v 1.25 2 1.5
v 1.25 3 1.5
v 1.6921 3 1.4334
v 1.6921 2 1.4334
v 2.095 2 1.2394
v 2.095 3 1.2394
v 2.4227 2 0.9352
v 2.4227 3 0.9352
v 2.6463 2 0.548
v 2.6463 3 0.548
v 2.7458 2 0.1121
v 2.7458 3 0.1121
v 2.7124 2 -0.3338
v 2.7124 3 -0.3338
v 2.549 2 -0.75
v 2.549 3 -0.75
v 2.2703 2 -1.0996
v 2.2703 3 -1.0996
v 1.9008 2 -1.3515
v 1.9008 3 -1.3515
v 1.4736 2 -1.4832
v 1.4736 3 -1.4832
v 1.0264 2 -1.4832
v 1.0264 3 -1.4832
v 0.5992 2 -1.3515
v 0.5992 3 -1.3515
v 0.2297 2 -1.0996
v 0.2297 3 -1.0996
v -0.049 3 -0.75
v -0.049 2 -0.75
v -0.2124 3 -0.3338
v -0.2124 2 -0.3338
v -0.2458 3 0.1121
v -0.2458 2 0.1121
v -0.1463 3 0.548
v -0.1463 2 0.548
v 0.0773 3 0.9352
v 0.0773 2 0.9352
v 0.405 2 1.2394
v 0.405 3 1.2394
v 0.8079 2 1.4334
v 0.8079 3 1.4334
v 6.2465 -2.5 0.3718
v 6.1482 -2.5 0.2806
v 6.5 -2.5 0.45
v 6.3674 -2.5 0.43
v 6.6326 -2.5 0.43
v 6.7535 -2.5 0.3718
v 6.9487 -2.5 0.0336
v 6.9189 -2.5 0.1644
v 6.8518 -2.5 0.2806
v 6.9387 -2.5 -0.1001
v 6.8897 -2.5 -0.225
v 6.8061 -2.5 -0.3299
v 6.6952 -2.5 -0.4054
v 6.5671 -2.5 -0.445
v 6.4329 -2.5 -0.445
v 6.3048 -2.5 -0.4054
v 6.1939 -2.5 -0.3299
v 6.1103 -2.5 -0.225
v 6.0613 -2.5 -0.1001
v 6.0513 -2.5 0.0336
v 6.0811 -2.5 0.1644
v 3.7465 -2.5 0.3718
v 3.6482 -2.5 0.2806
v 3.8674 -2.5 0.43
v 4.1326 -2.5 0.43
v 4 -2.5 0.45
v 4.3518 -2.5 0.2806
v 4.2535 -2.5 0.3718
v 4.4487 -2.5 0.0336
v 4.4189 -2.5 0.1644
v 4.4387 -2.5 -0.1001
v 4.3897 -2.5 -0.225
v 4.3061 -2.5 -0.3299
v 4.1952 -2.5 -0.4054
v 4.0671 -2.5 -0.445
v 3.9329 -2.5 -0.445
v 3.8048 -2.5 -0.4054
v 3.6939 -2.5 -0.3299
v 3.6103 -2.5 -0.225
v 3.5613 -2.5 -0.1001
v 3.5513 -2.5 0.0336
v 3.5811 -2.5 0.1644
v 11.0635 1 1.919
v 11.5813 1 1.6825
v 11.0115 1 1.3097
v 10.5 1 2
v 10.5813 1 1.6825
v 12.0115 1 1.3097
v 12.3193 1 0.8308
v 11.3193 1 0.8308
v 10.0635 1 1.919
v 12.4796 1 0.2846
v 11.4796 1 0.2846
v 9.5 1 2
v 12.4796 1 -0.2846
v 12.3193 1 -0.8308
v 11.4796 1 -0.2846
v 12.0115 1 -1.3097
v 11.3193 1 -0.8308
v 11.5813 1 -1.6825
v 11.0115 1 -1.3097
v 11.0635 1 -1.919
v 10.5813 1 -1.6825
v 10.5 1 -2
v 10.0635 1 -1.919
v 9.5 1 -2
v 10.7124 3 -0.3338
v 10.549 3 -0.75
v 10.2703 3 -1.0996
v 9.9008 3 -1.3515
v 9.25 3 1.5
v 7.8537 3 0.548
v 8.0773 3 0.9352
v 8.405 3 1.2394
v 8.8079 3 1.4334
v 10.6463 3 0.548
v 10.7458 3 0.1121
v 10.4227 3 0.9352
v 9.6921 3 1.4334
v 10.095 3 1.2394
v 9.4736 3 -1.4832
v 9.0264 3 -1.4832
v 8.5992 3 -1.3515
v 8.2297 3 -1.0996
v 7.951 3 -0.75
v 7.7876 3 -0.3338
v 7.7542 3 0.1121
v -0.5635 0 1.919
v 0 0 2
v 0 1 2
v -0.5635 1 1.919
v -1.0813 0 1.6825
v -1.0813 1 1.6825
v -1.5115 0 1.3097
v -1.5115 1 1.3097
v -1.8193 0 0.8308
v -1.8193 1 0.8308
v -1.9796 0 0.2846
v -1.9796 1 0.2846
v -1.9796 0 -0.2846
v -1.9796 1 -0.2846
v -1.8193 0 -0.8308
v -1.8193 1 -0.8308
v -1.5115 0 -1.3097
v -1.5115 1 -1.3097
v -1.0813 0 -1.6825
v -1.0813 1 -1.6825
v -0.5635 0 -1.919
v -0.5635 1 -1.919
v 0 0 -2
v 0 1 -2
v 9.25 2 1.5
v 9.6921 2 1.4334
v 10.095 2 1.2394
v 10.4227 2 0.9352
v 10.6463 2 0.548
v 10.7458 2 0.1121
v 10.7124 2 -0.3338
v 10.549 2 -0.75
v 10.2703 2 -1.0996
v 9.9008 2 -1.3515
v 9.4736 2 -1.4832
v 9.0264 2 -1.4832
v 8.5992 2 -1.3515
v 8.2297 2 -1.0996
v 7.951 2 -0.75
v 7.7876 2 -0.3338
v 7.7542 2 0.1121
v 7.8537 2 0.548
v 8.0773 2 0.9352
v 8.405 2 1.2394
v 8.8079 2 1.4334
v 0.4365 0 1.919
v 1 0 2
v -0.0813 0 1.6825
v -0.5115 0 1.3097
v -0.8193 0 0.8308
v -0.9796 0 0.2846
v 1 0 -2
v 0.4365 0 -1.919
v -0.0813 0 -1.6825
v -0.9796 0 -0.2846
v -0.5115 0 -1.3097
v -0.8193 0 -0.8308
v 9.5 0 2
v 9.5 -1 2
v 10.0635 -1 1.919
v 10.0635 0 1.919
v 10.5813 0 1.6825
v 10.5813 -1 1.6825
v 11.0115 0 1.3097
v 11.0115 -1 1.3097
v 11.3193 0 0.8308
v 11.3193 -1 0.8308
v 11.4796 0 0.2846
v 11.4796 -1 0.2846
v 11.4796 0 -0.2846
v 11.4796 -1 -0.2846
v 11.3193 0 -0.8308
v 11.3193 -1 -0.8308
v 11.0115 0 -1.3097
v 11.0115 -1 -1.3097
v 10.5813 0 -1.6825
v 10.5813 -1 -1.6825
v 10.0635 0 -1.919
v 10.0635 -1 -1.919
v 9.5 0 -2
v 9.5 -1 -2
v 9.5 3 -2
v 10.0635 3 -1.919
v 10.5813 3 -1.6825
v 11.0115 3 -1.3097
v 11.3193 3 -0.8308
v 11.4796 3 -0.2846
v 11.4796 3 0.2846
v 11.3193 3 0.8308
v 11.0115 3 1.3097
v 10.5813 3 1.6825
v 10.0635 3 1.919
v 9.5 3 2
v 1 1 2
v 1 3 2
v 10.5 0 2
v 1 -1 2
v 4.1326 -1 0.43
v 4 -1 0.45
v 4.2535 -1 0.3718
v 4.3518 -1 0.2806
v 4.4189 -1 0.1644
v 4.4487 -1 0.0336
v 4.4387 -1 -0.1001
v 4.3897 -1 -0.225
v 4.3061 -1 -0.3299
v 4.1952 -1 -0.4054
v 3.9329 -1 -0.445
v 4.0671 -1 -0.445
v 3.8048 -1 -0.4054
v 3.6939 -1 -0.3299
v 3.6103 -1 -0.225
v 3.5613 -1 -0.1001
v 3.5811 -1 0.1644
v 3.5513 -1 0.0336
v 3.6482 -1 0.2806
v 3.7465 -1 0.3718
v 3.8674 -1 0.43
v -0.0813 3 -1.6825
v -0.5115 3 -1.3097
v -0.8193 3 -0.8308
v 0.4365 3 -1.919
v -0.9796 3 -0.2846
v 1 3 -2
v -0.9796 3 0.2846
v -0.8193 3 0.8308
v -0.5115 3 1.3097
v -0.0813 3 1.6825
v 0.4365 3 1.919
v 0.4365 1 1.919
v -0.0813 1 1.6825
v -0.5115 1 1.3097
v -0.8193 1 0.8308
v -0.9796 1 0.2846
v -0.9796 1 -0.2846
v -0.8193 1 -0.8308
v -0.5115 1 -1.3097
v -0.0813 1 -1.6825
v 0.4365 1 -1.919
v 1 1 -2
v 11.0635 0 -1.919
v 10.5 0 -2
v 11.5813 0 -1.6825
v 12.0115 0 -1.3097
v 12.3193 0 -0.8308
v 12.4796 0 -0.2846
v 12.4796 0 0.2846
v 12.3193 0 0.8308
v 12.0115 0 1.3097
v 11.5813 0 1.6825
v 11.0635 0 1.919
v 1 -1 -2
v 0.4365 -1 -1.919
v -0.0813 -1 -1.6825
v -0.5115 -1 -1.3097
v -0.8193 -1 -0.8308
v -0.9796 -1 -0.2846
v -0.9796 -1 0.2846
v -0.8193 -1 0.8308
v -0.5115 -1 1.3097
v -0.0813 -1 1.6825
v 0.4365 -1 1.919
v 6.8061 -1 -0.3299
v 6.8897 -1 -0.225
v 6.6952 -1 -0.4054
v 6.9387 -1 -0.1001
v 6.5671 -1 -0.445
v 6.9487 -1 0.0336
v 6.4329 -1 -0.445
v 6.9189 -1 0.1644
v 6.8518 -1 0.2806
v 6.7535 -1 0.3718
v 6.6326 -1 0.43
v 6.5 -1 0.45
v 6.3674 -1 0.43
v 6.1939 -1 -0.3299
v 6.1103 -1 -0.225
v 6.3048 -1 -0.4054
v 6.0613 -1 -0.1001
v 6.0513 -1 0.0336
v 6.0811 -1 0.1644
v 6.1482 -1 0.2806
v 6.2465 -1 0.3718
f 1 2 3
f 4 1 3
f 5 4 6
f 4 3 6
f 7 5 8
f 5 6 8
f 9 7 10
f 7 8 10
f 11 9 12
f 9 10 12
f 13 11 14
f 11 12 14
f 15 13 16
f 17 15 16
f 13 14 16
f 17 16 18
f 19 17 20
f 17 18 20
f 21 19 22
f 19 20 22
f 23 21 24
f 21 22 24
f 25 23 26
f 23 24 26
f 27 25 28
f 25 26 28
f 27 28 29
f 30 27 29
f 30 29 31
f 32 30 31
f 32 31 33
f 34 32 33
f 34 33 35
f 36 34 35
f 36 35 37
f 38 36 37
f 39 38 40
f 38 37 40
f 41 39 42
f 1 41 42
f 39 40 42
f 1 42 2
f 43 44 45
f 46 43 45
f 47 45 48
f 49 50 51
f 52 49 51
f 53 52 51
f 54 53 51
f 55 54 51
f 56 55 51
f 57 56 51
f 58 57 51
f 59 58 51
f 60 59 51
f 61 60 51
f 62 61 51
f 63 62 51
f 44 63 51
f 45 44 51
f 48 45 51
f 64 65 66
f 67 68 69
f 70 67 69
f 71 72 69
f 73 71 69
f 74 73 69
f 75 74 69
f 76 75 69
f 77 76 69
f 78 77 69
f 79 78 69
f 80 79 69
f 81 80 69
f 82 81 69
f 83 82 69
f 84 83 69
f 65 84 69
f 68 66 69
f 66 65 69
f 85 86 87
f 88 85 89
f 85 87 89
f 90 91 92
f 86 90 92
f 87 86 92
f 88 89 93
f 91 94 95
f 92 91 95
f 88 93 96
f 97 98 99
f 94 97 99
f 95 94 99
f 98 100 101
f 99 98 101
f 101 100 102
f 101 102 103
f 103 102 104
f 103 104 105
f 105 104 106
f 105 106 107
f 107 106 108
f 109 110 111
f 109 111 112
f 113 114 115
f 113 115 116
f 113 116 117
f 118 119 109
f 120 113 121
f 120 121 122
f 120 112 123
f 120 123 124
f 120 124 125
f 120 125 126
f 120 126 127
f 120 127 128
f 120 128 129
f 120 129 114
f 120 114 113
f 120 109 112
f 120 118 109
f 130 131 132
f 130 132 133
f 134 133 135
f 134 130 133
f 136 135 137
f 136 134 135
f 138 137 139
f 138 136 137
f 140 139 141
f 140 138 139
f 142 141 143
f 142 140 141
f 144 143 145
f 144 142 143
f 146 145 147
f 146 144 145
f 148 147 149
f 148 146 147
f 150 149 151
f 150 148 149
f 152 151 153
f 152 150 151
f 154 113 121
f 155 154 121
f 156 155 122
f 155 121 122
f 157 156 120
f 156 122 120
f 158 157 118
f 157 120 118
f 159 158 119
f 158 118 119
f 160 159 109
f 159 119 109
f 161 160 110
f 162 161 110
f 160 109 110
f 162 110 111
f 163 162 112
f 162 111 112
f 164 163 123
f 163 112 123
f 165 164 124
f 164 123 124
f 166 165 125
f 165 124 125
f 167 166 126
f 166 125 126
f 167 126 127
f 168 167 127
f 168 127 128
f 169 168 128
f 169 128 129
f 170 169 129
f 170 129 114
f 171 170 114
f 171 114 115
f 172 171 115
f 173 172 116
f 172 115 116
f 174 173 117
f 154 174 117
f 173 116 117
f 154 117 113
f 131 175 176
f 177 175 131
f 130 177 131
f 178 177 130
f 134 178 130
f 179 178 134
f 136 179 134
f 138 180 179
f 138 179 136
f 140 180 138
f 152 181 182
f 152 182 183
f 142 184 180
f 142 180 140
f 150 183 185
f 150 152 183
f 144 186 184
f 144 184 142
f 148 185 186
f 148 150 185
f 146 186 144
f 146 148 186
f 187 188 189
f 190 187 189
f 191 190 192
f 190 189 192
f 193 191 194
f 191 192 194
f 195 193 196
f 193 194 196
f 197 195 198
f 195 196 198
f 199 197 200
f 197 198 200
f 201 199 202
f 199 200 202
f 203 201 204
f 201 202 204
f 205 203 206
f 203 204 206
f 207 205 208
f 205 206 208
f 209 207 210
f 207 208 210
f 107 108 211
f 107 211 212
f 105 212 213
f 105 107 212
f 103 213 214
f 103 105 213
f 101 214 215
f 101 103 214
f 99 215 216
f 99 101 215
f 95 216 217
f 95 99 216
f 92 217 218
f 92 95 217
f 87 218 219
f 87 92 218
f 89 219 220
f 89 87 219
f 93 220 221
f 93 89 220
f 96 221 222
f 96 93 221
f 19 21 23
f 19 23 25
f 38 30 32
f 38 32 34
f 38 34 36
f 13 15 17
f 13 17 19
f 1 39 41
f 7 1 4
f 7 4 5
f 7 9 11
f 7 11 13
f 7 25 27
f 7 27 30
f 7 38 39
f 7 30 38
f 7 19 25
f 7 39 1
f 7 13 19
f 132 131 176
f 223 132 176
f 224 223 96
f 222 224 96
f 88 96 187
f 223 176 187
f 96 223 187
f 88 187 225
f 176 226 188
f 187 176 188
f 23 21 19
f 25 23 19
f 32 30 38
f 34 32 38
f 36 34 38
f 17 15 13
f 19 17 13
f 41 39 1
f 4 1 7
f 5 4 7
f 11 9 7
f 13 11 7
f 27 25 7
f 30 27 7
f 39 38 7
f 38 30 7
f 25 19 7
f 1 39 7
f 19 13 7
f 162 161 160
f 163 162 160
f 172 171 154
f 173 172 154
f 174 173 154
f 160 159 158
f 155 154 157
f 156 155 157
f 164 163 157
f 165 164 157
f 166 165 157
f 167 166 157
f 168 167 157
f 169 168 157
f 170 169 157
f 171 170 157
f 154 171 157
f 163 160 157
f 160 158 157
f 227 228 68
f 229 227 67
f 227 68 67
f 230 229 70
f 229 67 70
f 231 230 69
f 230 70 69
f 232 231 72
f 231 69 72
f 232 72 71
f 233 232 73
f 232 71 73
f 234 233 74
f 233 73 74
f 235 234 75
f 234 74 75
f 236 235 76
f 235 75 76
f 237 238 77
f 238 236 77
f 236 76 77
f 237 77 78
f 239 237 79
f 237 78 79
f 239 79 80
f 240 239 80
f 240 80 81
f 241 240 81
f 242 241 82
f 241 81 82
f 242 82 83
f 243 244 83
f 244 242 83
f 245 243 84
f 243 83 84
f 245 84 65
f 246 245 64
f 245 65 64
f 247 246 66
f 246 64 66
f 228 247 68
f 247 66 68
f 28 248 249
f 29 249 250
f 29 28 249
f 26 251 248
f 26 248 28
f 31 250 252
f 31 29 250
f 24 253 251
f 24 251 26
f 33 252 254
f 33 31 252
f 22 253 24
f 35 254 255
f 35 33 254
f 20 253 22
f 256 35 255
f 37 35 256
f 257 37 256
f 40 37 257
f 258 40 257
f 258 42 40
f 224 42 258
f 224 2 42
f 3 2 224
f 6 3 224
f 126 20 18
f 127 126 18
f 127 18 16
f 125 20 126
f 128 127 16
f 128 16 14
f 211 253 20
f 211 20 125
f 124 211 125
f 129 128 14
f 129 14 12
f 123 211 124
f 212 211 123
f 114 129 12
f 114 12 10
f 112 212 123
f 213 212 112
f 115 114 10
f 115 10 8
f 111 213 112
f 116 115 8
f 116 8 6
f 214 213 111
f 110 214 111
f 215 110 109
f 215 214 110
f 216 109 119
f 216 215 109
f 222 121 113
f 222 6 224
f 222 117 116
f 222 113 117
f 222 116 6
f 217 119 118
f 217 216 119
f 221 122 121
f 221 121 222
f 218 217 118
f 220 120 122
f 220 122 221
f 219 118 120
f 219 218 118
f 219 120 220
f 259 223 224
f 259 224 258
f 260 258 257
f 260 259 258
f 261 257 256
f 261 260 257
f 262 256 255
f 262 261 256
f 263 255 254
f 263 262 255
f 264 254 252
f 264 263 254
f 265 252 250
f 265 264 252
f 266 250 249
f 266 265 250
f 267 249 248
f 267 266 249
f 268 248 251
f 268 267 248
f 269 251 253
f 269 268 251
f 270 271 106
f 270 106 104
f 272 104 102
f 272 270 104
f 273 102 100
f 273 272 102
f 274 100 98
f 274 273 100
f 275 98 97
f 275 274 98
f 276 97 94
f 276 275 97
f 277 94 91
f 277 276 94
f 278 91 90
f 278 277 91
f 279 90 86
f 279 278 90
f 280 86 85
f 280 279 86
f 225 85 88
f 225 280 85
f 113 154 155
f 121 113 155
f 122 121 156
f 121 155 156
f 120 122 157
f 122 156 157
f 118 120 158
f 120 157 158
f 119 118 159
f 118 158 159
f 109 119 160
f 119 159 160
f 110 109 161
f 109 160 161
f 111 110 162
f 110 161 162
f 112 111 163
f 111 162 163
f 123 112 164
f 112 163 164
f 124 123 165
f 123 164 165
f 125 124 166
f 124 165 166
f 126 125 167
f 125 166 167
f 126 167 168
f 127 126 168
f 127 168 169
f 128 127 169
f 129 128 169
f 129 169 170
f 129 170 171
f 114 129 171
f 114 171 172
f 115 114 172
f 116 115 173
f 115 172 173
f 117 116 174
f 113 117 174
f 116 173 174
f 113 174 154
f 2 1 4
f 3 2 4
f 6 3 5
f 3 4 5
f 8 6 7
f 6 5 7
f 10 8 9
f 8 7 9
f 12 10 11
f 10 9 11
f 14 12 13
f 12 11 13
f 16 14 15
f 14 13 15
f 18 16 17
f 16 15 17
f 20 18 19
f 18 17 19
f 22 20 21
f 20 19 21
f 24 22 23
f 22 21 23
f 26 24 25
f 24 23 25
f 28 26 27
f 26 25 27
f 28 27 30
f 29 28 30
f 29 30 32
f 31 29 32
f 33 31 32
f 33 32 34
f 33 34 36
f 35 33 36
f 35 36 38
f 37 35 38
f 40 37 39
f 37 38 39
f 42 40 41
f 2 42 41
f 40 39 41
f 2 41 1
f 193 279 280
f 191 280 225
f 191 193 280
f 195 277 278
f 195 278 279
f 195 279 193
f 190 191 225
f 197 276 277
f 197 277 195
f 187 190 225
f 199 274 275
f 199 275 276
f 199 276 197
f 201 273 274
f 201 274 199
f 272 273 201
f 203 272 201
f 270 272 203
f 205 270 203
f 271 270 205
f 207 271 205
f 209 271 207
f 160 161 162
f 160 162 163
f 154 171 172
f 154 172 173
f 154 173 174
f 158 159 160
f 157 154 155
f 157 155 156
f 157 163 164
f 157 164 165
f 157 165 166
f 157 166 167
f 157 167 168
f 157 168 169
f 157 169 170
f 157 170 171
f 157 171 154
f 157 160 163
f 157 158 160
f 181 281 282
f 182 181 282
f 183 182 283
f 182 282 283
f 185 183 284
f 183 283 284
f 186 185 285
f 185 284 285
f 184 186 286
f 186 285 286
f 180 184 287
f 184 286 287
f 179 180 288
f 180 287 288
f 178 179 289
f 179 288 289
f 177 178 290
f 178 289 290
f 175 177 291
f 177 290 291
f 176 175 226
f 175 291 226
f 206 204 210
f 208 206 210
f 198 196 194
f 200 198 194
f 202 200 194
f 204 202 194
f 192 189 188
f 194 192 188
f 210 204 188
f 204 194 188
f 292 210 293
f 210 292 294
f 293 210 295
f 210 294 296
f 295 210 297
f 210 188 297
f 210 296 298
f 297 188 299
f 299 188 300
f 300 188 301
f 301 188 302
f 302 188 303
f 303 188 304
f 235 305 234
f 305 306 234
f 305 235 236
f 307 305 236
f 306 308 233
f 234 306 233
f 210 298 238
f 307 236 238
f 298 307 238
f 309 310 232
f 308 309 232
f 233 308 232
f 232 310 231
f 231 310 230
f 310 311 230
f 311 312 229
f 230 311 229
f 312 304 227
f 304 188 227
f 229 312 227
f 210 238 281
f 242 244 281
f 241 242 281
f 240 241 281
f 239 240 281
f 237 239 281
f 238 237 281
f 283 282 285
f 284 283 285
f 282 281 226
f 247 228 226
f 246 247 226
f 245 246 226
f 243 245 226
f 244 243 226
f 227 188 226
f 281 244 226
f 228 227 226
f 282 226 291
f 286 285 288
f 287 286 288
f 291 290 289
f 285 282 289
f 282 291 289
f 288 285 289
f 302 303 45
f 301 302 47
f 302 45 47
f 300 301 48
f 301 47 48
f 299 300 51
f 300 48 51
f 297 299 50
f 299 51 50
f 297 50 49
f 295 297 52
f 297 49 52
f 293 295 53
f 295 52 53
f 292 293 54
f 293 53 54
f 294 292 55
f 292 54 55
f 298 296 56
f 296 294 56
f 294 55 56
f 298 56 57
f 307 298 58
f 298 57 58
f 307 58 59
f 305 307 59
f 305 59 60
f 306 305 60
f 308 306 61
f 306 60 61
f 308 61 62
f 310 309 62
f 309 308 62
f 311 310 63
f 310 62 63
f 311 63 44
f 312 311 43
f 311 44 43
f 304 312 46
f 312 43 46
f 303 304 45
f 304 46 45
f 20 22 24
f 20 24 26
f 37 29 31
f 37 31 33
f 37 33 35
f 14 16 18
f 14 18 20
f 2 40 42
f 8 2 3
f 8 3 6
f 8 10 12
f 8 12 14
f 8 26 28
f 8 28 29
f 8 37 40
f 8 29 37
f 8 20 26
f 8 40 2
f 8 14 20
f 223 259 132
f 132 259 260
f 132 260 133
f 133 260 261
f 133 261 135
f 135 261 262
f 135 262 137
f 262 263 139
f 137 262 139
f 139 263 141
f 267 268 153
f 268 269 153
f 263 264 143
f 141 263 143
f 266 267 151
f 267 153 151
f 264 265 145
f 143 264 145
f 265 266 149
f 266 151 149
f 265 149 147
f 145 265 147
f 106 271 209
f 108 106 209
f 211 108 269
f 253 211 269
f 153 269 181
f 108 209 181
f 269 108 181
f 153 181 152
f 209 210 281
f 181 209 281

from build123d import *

# Parameters (mm, degrees)
BOSS_EXTRUDE2_DEPTH         = 1
BOSS_EXTRUDE3_DEPTH         = 2
SKETCH7_R                   = 1.5
SKETCH7_R_2                 = 0.45
CUT_EXTRUDE1_DEPTH          = 1
SKETCH8_R                   = 1.5
BOSS_EXTRUDE4_DEPTH         = 1
BOSS_EXTRUDE4_2_DEPTH       = 1
BOSS_EXTRUDE12_DEPTH        = 1
BOSS_EXTRUDE12_DEPTH_BACK   = 4.5
SKETCH9_R                   = 0.45
BOSS_EXTRUDE12_2_DEPTH      = 1
BOSS_EXTRUDE12_2_DEPTH_BACK = 4.5
BOSS_EXTRUDE13_START        = 1
BOSS_EXTRUDE13_DEPTH        = 1


with BuildPart() as part:
    # Sketch4 → Boss-Extrude2 (new body)
    with BuildSketch(Plane(origin=(0, 0, 0), x_dir=(1, 0, 0), z_dir=(0, 1, 0))):
        with BuildLine():
            Line((0, 2), (10.5, 2))
            ThreePointArc((10.5, 2), (12.5, 0), (10.5, -2))
            Line((10.5, -2), (0, -2))
            ThreePointArc((0, -2), (-2, 0), (0, 2))
        make_face()
    extrude(amount=BOSS_EXTRUDE2_DEPTH)

    # Sketch5 → Boss-Extrude3 (add)
    with BuildSketch(Plane(origin=(0, 1, 0), x_dir=(1, 0, 0), z_dir=(0, 1, 0))):
        with BuildLine():
            Line((1, 2), (9.5, 2))
            ThreePointArc((9.5, 2), (11.5, 0), (9.5, -2))
            Line((9.5, -2), (1, -2))
            ThreePointArc((1, -2), (-1, 0), (1, 2))
        make_face()
    extrude(amount=BOSS_EXTRUDE3_DEPTH)

    # Sketch7 → Cut-Extrude1 (cut)
    with BuildSketch(Plane(origin=(0, 3, 0), x_dir=(1, 0, 0), z_dir=(0, 1, 0))):
        with Locations(Location((1.25, 0, 0), (0, 0, 270))):
            Circle(SKETCH7_R)
        with Locations(Location((9.25, 0, 0), (0, 0, 270))):
            Circle(SKETCH7_R)
        with Locations(Location((4, 0, 0), (0, 0, 270))):
            Circle(SKETCH7_R_2)
        with Locations(Location((6.5, 0, 0), (0, 0, 270))):
            Circle(SKETCH7_R_2)
    extrude(amount=-CUT_EXTRUDE1_DEPTH, mode=Mode.SUBTRACT)



with BuildPart() as body_2:
    # Sketch8 → Boss-Extrude4 (new body)
    with BuildSketch(Plane(origin=(0, 2, 0), x_dir=(1, 0, 0), z_dir=(0, 1, 0))):
        with Locations(Location((1.25, 0, 0), (0, 0, 270))):
            Circle(SKETCH8_R)
    extrude(amount=BOSS_EXTRUDE4_DEPTH)


with BuildPart() as body_3:
    # Sketch8 → Boss-Extrude4 2 (new body)
    with BuildSketch(Plane(origin=(0, 2, 0), x_dir=(1, 0, 0), z_dir=(0, 1, 0))):
        with Locations(Location((9.25, 0, 0), (0, 0, 270))):
            Circle(SKETCH8_R)
    extrude(amount=BOSS_EXTRUDE4_2_DEPTH)


with BuildPart() as body_4:
    # Sketch9 → Boss-Extrude12 (new, two sides: drawn at the far end of the back side and taken through both)
    with BuildSketch(Plane(origin=(0, 2, 0), x_dir=(1, 0, 0), z_dir=(0, 1, 0)).offset(-BOSS_EXTRUDE12_DEPTH_BACK)):
        with Locations(Location((4, 0, 0), (0, 0, 270))):
            Circle(SKETCH9_R)
    extrude(amount=BOSS_EXTRUDE12_DEPTH + BOSS_EXTRUDE12_DEPTH_BACK)


with BuildPart() as body_5:
    # Sketch9 → Boss-Extrude12 2 (new, two sides: drawn at the far end of the back side and taken through both)
    with BuildSketch(Plane(origin=(0, 2, 0), x_dir=(1, 0, 0), z_dir=(0, 1, 0)).offset(-BOSS_EXTRUDE12_2_DEPTH_BACK)):
        with Locations(Location((6.5, 0, 0), (0, 0, 270))):
            Circle(SKETCH9_R)
    extrude(amount=BOSS_EXTRUDE12_2_DEPTH + BOSS_EXTRUDE12_2_DEPTH_BACK)


with BuildPart() as part_1:
    add(part.part)

    add(body_4.part)  # Boss-Extrude13 merges body 4

    add(body_5.part)  # Boss-Extrude13 merges body 5
    # Sketch11 → Boss-Extrude13 (add)
    with BuildSketch(Plane.XZ.offset(BOSS_EXTRUDE13_START)):
        with BuildLine():
            Line((1, 2), (9.5, 2))
            ThreePointArc((9.5, 2), (11.5, 0), (9.5, -2))
            Line((9.5, -2), (1, -2))
            ThreePointArc((1, -2), (-1, 0), (1, 2))
        make_face()
    extrude(amount=-BOSS_EXTRUDE13_DEPTH)


solid = Compound([body_2.part, body_3.part, part_1.part])
